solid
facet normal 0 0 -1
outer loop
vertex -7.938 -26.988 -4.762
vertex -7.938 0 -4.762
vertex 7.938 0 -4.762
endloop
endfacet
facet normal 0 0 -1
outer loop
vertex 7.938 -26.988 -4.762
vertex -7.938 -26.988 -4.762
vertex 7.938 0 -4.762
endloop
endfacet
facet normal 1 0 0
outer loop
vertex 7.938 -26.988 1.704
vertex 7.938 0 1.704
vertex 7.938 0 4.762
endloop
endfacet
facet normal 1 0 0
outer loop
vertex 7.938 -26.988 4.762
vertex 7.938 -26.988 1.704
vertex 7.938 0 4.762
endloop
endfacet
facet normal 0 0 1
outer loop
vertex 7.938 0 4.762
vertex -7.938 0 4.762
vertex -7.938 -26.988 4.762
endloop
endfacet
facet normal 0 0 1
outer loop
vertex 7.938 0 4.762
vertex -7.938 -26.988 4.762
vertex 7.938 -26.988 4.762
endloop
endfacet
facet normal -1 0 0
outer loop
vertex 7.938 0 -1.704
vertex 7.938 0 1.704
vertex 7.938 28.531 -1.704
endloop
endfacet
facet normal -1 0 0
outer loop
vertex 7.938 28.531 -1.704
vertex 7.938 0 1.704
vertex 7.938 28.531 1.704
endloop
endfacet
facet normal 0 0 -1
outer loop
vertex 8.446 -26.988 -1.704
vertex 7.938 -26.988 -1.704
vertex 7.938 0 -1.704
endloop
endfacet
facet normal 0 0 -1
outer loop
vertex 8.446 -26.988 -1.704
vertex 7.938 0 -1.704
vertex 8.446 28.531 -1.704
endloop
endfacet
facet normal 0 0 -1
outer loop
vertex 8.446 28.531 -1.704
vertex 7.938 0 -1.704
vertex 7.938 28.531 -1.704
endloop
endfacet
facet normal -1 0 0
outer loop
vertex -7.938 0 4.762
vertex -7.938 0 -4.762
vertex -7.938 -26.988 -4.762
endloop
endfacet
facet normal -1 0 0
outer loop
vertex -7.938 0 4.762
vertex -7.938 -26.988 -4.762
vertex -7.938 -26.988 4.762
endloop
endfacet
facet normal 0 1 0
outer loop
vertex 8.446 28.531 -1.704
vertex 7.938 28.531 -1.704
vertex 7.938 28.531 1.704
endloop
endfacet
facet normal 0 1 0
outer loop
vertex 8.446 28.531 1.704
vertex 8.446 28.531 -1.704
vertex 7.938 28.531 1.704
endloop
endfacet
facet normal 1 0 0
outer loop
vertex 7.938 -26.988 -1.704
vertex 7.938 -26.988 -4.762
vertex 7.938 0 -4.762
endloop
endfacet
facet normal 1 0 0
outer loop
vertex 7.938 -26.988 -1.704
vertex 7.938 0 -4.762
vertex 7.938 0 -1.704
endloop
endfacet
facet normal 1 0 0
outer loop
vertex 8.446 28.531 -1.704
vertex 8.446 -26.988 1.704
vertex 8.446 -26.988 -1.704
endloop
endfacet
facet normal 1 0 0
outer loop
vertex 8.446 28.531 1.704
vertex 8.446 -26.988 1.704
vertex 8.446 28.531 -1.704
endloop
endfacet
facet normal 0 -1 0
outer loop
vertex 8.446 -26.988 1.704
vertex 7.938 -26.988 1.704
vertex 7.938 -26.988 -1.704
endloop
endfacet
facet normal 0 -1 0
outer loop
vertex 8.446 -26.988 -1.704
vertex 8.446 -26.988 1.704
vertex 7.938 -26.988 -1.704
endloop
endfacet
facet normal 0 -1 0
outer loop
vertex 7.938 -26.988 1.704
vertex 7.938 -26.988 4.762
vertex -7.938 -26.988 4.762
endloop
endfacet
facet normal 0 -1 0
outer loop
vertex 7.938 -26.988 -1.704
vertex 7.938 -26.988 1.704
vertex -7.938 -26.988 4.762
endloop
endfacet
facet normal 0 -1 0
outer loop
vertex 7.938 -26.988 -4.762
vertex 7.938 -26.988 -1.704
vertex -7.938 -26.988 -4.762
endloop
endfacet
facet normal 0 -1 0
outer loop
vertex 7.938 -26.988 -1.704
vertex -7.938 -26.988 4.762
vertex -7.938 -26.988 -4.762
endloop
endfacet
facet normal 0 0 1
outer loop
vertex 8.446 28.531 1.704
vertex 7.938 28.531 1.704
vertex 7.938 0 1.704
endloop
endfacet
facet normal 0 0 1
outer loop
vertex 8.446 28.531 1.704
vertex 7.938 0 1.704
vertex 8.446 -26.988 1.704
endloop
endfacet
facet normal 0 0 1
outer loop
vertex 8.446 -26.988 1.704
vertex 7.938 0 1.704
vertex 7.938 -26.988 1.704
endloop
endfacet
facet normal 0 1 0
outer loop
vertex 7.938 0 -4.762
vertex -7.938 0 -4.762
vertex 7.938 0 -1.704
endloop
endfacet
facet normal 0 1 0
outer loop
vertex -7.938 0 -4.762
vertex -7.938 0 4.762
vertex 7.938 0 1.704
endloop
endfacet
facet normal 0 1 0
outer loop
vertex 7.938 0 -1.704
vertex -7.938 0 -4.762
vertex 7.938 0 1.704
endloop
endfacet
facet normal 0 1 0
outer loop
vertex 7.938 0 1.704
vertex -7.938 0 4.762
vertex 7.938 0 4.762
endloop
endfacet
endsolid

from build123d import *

# Parameters (mm, degrees)
F0_W     = 15.875
F0_H     = 9.525
F1_DEPTH = 26.9875
F2_W     = 28.530914
F2_H     = 1.703672
F2_W_2   = 26.9875
F3_DEPTH = 0.508


with BuildPart() as f1:
    # F0 (on Front) → F1 (new body)
    with BuildSketch(Plane.XZ):
        Rectangle(F0_W, F0_H)
    extrude(amount=F1_DEPTH)

    # F2 (on face) → F3 (join)
    with BuildSketch(Plane.YZ.offset(7.9375)):
        with Locations((14.265457, 0.851836)):
            Rectangle(F2_W, F2_H)
        with Locations((-13.49375, 0.851836)):
            Rectangle(F2_W_2, F2_H)
        with Locations((-13.49375, -0.851836)):
            Rectangle(F2_W_2, F2_H)
        with Locations((14.265457, -0.851836)):
            Rectangle(F2_W, F2_H)
    extrude(amount=F3_DEPTH)


solid = f1.part
